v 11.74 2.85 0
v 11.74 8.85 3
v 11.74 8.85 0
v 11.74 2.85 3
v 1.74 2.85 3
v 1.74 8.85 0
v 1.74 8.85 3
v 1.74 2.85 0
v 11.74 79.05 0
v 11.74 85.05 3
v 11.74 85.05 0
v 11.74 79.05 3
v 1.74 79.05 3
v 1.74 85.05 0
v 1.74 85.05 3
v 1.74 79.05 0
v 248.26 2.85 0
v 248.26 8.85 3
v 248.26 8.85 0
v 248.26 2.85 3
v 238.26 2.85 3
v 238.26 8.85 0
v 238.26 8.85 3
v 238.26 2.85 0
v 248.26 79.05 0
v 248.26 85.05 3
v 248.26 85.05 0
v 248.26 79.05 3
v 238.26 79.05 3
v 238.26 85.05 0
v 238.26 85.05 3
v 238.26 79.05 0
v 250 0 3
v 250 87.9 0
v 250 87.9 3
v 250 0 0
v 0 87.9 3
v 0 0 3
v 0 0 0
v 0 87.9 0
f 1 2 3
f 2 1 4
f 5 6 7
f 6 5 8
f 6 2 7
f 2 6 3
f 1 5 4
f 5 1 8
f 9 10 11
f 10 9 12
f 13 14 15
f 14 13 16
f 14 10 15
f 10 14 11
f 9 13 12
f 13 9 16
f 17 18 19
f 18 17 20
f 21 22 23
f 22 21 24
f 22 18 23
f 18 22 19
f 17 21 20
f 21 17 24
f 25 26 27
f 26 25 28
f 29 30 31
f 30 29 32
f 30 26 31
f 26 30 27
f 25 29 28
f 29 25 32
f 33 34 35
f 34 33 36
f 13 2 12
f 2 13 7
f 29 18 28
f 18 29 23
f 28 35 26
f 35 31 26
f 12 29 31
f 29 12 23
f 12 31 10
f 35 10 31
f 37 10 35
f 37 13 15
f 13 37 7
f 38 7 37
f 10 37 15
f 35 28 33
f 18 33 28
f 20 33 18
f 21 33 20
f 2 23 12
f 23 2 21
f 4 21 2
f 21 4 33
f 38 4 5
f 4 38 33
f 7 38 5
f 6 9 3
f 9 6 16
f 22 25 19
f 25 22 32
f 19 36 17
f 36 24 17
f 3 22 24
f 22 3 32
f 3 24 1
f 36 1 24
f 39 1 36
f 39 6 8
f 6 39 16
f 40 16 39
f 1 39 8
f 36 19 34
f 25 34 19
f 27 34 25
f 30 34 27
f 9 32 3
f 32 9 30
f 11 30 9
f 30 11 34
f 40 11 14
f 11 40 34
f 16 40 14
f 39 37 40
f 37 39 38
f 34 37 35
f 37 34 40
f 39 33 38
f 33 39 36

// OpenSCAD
// TL1_Plate_2U_Standard
// Homelab Rack CAD Standard v1.0 - millimeters
// Mount positions provisional: test-fit against DeskPi TL1 rail!
plate_width=250;
plate_height=87.9;
plate_thickness=3;
slot_width=10;
slot_height=6;
slot_x=[6.74,243.26];
slot_y=[5.85,82.05];
difference() {
  cube([plate_width,plate_height,plate_thickness]);
  for (x=slot_x) for (y=slot_y)
    translate([x-slot_width/2,y-slot_height/2,-0.5])
      cube([slot_width,slot_height,plate_thickness+1]);
}
